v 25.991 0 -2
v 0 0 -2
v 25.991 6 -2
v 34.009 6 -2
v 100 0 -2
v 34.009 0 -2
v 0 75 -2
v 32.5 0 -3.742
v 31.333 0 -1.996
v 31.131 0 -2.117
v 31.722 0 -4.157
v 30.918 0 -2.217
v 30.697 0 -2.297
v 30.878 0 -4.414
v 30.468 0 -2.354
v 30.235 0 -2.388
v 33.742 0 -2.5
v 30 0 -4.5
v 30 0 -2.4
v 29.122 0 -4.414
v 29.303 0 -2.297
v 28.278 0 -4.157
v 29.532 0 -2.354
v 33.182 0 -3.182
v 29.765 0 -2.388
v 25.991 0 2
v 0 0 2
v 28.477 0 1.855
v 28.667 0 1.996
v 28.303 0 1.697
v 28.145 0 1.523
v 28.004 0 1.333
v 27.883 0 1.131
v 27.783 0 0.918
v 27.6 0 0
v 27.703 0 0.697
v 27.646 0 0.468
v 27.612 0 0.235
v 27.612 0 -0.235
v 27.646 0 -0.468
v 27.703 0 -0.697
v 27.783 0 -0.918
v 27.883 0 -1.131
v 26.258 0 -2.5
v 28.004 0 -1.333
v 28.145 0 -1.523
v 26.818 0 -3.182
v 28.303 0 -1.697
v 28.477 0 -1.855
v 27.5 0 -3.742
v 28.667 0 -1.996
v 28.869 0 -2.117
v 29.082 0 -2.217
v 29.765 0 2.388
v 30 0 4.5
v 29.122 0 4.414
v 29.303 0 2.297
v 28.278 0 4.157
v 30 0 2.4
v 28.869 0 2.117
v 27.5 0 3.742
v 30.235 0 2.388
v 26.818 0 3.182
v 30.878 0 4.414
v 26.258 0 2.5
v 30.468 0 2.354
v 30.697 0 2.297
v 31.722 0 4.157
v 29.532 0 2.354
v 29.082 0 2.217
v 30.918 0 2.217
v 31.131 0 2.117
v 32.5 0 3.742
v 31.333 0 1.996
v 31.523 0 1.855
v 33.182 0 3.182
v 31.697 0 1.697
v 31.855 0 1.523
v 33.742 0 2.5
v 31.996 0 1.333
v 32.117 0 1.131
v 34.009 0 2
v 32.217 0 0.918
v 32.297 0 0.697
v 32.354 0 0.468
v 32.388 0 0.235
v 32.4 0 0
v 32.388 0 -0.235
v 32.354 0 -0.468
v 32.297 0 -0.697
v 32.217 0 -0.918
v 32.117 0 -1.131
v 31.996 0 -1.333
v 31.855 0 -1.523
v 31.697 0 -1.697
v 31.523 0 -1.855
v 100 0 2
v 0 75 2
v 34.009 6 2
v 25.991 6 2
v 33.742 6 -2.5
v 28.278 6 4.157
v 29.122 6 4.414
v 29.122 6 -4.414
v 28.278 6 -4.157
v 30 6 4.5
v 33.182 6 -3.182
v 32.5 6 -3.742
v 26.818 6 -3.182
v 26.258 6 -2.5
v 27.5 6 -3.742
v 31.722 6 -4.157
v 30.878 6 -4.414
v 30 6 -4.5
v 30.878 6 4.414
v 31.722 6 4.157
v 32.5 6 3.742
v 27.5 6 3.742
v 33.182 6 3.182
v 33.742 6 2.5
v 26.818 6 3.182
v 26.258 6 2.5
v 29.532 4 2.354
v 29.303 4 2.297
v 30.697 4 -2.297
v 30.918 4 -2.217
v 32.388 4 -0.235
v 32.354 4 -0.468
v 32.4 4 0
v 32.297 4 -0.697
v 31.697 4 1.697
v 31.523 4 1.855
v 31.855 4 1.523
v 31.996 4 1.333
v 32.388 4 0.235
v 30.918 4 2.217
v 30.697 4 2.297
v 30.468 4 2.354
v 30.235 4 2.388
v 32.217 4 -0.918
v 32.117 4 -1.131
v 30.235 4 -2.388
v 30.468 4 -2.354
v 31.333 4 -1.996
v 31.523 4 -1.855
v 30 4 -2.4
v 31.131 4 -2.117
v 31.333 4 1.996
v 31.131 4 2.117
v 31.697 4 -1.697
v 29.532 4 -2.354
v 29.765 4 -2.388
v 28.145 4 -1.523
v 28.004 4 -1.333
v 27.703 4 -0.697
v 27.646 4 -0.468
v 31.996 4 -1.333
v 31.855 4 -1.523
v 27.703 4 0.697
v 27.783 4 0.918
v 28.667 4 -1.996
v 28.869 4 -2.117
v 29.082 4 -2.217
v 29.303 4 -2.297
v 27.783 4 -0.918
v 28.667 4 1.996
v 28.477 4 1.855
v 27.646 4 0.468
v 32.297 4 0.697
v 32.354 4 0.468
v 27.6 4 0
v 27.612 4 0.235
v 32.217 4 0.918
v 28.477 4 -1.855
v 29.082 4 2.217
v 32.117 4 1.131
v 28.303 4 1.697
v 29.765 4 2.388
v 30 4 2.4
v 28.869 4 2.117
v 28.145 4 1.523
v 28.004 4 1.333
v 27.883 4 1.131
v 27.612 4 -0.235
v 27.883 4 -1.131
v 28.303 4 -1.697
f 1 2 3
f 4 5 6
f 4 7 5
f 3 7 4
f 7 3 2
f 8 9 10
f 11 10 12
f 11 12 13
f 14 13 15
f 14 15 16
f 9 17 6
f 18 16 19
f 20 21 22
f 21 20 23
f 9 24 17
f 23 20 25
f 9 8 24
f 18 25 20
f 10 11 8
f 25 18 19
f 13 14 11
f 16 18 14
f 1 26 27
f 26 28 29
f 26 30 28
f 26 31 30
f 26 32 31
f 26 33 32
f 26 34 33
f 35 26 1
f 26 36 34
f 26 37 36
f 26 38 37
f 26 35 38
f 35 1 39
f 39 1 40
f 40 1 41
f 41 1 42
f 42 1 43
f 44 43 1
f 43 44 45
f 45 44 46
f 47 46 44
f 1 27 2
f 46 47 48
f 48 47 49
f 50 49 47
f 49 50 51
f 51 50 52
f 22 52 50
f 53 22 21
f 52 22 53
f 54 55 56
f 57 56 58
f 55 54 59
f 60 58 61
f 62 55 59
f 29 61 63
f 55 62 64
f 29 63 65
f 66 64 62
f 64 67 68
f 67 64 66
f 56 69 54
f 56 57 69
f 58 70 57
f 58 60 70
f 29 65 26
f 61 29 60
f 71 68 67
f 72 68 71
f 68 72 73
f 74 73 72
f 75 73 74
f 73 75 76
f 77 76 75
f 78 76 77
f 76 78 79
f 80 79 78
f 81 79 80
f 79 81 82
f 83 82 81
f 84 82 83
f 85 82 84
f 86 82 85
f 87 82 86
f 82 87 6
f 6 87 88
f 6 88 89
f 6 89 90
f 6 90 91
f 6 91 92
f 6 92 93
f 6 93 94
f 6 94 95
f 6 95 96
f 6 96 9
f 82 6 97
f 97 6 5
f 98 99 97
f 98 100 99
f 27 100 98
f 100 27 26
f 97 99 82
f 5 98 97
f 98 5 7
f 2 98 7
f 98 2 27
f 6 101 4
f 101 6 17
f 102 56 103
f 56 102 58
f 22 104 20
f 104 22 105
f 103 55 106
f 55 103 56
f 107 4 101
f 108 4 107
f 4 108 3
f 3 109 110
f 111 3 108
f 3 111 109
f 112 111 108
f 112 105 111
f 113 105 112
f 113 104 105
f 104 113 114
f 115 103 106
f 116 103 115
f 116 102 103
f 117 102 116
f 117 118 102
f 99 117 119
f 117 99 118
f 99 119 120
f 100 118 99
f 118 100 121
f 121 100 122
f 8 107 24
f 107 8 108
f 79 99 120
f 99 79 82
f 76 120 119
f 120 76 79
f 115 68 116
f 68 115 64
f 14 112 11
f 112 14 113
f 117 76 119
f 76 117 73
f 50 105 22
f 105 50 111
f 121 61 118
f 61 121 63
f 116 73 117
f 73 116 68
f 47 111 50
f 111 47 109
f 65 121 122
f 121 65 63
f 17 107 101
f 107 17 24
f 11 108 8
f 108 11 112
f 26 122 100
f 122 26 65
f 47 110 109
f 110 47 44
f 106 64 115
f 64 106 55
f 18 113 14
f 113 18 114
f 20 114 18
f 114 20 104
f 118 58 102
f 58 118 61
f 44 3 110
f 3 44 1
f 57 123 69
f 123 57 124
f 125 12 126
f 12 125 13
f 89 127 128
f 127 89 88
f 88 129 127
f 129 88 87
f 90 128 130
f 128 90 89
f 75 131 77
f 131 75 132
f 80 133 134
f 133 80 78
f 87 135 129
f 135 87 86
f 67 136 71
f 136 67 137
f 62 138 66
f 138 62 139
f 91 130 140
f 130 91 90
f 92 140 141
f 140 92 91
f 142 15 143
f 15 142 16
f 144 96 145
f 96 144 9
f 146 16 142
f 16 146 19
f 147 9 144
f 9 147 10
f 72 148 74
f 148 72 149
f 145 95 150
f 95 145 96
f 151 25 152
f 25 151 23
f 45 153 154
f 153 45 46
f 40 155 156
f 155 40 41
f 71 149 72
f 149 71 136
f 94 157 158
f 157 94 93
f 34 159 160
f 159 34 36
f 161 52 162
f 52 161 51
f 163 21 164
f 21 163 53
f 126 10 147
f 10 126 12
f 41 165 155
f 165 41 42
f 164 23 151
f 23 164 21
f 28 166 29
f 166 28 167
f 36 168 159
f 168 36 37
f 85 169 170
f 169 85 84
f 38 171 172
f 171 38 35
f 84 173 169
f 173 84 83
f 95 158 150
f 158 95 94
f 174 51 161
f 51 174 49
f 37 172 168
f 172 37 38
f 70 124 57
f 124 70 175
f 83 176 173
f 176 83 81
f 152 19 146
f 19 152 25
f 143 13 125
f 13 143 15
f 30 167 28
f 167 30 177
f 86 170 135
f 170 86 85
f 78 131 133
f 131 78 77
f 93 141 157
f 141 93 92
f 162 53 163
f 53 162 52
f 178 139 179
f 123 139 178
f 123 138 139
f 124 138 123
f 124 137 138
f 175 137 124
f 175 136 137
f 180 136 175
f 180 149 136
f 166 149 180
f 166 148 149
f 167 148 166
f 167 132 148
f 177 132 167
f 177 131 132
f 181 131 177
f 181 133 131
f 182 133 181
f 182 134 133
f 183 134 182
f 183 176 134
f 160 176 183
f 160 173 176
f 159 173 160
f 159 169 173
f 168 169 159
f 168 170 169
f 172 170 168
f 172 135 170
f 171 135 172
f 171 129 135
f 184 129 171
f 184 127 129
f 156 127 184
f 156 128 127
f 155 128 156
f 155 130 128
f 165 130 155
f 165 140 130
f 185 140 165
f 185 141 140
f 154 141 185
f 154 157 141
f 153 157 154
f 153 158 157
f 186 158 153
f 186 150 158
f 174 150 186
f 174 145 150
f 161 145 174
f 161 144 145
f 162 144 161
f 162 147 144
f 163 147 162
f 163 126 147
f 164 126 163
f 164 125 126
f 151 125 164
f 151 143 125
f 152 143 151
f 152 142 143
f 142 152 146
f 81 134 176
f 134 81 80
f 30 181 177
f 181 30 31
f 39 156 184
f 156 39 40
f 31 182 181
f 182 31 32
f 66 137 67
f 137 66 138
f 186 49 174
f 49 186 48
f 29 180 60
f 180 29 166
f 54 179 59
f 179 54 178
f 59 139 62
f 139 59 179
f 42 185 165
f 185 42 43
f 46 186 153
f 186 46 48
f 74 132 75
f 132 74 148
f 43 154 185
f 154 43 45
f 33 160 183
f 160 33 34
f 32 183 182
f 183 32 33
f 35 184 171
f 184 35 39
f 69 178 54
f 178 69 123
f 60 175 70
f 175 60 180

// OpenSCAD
// =============================================================
// Triangular canard fin, servo actuated
// - Simple triangular planform
// - Round socket bored into the root edge that presses directly
//   onto the servo's 20-tooth output spline, the same way a horn
//   does: the teeth bite into the printed bore for the grip
// =============================================================
// Coordinate system:
//   X = chordwise  (LE at +X, TE at X=0)
//   Y = spanwise   (root at Y=0, tip at +Y)
//   Z = thickness  (symmetric about Z=0)
// =============================================================

/* [Planform] */
fin_height    = 75;    // root-to-tip span (mm)
fin_width     = 100;     // root chord (mm)
tip_offset    = 0;     // X position of the tip point (mm from TE)
fin_thickness = 4;      // overall fin thickness (mm)

/* [Servo spline socket] */
// Round socket bored into the root edge along the hinge axis.
// The fin presses onto the servo's output spline like a horn:
// the 20 teeth cut into the printed bore and key the fin.
spline_axis_x   = 30;     // chordwise position of servo shaft axis (mm from TE)
spline_d        = 4.8;    // 20-tooth spline outer diameter (mm)
spline_fit      = 0;      // bore adjustment: negative = tighter press fit (mm)
spline_depth    = 4;      // socket depth = spline engagement length (mm)

/* [Spline boss] */
// The 4.8 mm socket is wider than the fin is thick, so a round
// boss (like a horn hub) reinforces the bore at the root edge.
boss_d          = 9;      // boss outer diameter (mm)
boss_length     = 6;      // boss length up from the root edge (mm)

$fn = 32;
eps = 0.01;

// =============================================================
// Triangular planform (2D, XY plane)
// =============================================================
module fin_planform_2d() {
    polygon([
        [0, 0],              // trailing edge, root
        [fin_width, 0],      // leading edge, root
        [tip_offset, fin_height]  // tip
    ]);
}

// =============================================================
// Spline boss - hub-like cylinder on the hinge axis at the root
// edge, thick enough to wrap the spline socket on all sides
// =============================================================
module spline_boss() {
    translate([spline_axis_x, 0, 0])
        rotate([-90, 0, 0])
            cylinder(d = boss_d, h = boss_length);
}

// =============================================================
// Spline socket - round bore entering the root edge along the
// hinge axis; presses onto the 20-tooth servo spline
// =============================================================
module spline_socket() {
    translate([spline_axis_x, -eps, 0])
        rotate([-90, 0, 0])
            cylinder(d = spline_d + spline_fit, h = spline_depth + eps, $fn = 64);
}

// =============================================================
// Canard fin
// =============================================================
module canard() {
    difference() {
        union() {
            linear_extrude(height = fin_thickness, center = true)
                fin_planform_2d();
            spline_boss();
        }
        spline_socket();
    }
}

// =============================================================
// Render
// =============================================================
canard();
